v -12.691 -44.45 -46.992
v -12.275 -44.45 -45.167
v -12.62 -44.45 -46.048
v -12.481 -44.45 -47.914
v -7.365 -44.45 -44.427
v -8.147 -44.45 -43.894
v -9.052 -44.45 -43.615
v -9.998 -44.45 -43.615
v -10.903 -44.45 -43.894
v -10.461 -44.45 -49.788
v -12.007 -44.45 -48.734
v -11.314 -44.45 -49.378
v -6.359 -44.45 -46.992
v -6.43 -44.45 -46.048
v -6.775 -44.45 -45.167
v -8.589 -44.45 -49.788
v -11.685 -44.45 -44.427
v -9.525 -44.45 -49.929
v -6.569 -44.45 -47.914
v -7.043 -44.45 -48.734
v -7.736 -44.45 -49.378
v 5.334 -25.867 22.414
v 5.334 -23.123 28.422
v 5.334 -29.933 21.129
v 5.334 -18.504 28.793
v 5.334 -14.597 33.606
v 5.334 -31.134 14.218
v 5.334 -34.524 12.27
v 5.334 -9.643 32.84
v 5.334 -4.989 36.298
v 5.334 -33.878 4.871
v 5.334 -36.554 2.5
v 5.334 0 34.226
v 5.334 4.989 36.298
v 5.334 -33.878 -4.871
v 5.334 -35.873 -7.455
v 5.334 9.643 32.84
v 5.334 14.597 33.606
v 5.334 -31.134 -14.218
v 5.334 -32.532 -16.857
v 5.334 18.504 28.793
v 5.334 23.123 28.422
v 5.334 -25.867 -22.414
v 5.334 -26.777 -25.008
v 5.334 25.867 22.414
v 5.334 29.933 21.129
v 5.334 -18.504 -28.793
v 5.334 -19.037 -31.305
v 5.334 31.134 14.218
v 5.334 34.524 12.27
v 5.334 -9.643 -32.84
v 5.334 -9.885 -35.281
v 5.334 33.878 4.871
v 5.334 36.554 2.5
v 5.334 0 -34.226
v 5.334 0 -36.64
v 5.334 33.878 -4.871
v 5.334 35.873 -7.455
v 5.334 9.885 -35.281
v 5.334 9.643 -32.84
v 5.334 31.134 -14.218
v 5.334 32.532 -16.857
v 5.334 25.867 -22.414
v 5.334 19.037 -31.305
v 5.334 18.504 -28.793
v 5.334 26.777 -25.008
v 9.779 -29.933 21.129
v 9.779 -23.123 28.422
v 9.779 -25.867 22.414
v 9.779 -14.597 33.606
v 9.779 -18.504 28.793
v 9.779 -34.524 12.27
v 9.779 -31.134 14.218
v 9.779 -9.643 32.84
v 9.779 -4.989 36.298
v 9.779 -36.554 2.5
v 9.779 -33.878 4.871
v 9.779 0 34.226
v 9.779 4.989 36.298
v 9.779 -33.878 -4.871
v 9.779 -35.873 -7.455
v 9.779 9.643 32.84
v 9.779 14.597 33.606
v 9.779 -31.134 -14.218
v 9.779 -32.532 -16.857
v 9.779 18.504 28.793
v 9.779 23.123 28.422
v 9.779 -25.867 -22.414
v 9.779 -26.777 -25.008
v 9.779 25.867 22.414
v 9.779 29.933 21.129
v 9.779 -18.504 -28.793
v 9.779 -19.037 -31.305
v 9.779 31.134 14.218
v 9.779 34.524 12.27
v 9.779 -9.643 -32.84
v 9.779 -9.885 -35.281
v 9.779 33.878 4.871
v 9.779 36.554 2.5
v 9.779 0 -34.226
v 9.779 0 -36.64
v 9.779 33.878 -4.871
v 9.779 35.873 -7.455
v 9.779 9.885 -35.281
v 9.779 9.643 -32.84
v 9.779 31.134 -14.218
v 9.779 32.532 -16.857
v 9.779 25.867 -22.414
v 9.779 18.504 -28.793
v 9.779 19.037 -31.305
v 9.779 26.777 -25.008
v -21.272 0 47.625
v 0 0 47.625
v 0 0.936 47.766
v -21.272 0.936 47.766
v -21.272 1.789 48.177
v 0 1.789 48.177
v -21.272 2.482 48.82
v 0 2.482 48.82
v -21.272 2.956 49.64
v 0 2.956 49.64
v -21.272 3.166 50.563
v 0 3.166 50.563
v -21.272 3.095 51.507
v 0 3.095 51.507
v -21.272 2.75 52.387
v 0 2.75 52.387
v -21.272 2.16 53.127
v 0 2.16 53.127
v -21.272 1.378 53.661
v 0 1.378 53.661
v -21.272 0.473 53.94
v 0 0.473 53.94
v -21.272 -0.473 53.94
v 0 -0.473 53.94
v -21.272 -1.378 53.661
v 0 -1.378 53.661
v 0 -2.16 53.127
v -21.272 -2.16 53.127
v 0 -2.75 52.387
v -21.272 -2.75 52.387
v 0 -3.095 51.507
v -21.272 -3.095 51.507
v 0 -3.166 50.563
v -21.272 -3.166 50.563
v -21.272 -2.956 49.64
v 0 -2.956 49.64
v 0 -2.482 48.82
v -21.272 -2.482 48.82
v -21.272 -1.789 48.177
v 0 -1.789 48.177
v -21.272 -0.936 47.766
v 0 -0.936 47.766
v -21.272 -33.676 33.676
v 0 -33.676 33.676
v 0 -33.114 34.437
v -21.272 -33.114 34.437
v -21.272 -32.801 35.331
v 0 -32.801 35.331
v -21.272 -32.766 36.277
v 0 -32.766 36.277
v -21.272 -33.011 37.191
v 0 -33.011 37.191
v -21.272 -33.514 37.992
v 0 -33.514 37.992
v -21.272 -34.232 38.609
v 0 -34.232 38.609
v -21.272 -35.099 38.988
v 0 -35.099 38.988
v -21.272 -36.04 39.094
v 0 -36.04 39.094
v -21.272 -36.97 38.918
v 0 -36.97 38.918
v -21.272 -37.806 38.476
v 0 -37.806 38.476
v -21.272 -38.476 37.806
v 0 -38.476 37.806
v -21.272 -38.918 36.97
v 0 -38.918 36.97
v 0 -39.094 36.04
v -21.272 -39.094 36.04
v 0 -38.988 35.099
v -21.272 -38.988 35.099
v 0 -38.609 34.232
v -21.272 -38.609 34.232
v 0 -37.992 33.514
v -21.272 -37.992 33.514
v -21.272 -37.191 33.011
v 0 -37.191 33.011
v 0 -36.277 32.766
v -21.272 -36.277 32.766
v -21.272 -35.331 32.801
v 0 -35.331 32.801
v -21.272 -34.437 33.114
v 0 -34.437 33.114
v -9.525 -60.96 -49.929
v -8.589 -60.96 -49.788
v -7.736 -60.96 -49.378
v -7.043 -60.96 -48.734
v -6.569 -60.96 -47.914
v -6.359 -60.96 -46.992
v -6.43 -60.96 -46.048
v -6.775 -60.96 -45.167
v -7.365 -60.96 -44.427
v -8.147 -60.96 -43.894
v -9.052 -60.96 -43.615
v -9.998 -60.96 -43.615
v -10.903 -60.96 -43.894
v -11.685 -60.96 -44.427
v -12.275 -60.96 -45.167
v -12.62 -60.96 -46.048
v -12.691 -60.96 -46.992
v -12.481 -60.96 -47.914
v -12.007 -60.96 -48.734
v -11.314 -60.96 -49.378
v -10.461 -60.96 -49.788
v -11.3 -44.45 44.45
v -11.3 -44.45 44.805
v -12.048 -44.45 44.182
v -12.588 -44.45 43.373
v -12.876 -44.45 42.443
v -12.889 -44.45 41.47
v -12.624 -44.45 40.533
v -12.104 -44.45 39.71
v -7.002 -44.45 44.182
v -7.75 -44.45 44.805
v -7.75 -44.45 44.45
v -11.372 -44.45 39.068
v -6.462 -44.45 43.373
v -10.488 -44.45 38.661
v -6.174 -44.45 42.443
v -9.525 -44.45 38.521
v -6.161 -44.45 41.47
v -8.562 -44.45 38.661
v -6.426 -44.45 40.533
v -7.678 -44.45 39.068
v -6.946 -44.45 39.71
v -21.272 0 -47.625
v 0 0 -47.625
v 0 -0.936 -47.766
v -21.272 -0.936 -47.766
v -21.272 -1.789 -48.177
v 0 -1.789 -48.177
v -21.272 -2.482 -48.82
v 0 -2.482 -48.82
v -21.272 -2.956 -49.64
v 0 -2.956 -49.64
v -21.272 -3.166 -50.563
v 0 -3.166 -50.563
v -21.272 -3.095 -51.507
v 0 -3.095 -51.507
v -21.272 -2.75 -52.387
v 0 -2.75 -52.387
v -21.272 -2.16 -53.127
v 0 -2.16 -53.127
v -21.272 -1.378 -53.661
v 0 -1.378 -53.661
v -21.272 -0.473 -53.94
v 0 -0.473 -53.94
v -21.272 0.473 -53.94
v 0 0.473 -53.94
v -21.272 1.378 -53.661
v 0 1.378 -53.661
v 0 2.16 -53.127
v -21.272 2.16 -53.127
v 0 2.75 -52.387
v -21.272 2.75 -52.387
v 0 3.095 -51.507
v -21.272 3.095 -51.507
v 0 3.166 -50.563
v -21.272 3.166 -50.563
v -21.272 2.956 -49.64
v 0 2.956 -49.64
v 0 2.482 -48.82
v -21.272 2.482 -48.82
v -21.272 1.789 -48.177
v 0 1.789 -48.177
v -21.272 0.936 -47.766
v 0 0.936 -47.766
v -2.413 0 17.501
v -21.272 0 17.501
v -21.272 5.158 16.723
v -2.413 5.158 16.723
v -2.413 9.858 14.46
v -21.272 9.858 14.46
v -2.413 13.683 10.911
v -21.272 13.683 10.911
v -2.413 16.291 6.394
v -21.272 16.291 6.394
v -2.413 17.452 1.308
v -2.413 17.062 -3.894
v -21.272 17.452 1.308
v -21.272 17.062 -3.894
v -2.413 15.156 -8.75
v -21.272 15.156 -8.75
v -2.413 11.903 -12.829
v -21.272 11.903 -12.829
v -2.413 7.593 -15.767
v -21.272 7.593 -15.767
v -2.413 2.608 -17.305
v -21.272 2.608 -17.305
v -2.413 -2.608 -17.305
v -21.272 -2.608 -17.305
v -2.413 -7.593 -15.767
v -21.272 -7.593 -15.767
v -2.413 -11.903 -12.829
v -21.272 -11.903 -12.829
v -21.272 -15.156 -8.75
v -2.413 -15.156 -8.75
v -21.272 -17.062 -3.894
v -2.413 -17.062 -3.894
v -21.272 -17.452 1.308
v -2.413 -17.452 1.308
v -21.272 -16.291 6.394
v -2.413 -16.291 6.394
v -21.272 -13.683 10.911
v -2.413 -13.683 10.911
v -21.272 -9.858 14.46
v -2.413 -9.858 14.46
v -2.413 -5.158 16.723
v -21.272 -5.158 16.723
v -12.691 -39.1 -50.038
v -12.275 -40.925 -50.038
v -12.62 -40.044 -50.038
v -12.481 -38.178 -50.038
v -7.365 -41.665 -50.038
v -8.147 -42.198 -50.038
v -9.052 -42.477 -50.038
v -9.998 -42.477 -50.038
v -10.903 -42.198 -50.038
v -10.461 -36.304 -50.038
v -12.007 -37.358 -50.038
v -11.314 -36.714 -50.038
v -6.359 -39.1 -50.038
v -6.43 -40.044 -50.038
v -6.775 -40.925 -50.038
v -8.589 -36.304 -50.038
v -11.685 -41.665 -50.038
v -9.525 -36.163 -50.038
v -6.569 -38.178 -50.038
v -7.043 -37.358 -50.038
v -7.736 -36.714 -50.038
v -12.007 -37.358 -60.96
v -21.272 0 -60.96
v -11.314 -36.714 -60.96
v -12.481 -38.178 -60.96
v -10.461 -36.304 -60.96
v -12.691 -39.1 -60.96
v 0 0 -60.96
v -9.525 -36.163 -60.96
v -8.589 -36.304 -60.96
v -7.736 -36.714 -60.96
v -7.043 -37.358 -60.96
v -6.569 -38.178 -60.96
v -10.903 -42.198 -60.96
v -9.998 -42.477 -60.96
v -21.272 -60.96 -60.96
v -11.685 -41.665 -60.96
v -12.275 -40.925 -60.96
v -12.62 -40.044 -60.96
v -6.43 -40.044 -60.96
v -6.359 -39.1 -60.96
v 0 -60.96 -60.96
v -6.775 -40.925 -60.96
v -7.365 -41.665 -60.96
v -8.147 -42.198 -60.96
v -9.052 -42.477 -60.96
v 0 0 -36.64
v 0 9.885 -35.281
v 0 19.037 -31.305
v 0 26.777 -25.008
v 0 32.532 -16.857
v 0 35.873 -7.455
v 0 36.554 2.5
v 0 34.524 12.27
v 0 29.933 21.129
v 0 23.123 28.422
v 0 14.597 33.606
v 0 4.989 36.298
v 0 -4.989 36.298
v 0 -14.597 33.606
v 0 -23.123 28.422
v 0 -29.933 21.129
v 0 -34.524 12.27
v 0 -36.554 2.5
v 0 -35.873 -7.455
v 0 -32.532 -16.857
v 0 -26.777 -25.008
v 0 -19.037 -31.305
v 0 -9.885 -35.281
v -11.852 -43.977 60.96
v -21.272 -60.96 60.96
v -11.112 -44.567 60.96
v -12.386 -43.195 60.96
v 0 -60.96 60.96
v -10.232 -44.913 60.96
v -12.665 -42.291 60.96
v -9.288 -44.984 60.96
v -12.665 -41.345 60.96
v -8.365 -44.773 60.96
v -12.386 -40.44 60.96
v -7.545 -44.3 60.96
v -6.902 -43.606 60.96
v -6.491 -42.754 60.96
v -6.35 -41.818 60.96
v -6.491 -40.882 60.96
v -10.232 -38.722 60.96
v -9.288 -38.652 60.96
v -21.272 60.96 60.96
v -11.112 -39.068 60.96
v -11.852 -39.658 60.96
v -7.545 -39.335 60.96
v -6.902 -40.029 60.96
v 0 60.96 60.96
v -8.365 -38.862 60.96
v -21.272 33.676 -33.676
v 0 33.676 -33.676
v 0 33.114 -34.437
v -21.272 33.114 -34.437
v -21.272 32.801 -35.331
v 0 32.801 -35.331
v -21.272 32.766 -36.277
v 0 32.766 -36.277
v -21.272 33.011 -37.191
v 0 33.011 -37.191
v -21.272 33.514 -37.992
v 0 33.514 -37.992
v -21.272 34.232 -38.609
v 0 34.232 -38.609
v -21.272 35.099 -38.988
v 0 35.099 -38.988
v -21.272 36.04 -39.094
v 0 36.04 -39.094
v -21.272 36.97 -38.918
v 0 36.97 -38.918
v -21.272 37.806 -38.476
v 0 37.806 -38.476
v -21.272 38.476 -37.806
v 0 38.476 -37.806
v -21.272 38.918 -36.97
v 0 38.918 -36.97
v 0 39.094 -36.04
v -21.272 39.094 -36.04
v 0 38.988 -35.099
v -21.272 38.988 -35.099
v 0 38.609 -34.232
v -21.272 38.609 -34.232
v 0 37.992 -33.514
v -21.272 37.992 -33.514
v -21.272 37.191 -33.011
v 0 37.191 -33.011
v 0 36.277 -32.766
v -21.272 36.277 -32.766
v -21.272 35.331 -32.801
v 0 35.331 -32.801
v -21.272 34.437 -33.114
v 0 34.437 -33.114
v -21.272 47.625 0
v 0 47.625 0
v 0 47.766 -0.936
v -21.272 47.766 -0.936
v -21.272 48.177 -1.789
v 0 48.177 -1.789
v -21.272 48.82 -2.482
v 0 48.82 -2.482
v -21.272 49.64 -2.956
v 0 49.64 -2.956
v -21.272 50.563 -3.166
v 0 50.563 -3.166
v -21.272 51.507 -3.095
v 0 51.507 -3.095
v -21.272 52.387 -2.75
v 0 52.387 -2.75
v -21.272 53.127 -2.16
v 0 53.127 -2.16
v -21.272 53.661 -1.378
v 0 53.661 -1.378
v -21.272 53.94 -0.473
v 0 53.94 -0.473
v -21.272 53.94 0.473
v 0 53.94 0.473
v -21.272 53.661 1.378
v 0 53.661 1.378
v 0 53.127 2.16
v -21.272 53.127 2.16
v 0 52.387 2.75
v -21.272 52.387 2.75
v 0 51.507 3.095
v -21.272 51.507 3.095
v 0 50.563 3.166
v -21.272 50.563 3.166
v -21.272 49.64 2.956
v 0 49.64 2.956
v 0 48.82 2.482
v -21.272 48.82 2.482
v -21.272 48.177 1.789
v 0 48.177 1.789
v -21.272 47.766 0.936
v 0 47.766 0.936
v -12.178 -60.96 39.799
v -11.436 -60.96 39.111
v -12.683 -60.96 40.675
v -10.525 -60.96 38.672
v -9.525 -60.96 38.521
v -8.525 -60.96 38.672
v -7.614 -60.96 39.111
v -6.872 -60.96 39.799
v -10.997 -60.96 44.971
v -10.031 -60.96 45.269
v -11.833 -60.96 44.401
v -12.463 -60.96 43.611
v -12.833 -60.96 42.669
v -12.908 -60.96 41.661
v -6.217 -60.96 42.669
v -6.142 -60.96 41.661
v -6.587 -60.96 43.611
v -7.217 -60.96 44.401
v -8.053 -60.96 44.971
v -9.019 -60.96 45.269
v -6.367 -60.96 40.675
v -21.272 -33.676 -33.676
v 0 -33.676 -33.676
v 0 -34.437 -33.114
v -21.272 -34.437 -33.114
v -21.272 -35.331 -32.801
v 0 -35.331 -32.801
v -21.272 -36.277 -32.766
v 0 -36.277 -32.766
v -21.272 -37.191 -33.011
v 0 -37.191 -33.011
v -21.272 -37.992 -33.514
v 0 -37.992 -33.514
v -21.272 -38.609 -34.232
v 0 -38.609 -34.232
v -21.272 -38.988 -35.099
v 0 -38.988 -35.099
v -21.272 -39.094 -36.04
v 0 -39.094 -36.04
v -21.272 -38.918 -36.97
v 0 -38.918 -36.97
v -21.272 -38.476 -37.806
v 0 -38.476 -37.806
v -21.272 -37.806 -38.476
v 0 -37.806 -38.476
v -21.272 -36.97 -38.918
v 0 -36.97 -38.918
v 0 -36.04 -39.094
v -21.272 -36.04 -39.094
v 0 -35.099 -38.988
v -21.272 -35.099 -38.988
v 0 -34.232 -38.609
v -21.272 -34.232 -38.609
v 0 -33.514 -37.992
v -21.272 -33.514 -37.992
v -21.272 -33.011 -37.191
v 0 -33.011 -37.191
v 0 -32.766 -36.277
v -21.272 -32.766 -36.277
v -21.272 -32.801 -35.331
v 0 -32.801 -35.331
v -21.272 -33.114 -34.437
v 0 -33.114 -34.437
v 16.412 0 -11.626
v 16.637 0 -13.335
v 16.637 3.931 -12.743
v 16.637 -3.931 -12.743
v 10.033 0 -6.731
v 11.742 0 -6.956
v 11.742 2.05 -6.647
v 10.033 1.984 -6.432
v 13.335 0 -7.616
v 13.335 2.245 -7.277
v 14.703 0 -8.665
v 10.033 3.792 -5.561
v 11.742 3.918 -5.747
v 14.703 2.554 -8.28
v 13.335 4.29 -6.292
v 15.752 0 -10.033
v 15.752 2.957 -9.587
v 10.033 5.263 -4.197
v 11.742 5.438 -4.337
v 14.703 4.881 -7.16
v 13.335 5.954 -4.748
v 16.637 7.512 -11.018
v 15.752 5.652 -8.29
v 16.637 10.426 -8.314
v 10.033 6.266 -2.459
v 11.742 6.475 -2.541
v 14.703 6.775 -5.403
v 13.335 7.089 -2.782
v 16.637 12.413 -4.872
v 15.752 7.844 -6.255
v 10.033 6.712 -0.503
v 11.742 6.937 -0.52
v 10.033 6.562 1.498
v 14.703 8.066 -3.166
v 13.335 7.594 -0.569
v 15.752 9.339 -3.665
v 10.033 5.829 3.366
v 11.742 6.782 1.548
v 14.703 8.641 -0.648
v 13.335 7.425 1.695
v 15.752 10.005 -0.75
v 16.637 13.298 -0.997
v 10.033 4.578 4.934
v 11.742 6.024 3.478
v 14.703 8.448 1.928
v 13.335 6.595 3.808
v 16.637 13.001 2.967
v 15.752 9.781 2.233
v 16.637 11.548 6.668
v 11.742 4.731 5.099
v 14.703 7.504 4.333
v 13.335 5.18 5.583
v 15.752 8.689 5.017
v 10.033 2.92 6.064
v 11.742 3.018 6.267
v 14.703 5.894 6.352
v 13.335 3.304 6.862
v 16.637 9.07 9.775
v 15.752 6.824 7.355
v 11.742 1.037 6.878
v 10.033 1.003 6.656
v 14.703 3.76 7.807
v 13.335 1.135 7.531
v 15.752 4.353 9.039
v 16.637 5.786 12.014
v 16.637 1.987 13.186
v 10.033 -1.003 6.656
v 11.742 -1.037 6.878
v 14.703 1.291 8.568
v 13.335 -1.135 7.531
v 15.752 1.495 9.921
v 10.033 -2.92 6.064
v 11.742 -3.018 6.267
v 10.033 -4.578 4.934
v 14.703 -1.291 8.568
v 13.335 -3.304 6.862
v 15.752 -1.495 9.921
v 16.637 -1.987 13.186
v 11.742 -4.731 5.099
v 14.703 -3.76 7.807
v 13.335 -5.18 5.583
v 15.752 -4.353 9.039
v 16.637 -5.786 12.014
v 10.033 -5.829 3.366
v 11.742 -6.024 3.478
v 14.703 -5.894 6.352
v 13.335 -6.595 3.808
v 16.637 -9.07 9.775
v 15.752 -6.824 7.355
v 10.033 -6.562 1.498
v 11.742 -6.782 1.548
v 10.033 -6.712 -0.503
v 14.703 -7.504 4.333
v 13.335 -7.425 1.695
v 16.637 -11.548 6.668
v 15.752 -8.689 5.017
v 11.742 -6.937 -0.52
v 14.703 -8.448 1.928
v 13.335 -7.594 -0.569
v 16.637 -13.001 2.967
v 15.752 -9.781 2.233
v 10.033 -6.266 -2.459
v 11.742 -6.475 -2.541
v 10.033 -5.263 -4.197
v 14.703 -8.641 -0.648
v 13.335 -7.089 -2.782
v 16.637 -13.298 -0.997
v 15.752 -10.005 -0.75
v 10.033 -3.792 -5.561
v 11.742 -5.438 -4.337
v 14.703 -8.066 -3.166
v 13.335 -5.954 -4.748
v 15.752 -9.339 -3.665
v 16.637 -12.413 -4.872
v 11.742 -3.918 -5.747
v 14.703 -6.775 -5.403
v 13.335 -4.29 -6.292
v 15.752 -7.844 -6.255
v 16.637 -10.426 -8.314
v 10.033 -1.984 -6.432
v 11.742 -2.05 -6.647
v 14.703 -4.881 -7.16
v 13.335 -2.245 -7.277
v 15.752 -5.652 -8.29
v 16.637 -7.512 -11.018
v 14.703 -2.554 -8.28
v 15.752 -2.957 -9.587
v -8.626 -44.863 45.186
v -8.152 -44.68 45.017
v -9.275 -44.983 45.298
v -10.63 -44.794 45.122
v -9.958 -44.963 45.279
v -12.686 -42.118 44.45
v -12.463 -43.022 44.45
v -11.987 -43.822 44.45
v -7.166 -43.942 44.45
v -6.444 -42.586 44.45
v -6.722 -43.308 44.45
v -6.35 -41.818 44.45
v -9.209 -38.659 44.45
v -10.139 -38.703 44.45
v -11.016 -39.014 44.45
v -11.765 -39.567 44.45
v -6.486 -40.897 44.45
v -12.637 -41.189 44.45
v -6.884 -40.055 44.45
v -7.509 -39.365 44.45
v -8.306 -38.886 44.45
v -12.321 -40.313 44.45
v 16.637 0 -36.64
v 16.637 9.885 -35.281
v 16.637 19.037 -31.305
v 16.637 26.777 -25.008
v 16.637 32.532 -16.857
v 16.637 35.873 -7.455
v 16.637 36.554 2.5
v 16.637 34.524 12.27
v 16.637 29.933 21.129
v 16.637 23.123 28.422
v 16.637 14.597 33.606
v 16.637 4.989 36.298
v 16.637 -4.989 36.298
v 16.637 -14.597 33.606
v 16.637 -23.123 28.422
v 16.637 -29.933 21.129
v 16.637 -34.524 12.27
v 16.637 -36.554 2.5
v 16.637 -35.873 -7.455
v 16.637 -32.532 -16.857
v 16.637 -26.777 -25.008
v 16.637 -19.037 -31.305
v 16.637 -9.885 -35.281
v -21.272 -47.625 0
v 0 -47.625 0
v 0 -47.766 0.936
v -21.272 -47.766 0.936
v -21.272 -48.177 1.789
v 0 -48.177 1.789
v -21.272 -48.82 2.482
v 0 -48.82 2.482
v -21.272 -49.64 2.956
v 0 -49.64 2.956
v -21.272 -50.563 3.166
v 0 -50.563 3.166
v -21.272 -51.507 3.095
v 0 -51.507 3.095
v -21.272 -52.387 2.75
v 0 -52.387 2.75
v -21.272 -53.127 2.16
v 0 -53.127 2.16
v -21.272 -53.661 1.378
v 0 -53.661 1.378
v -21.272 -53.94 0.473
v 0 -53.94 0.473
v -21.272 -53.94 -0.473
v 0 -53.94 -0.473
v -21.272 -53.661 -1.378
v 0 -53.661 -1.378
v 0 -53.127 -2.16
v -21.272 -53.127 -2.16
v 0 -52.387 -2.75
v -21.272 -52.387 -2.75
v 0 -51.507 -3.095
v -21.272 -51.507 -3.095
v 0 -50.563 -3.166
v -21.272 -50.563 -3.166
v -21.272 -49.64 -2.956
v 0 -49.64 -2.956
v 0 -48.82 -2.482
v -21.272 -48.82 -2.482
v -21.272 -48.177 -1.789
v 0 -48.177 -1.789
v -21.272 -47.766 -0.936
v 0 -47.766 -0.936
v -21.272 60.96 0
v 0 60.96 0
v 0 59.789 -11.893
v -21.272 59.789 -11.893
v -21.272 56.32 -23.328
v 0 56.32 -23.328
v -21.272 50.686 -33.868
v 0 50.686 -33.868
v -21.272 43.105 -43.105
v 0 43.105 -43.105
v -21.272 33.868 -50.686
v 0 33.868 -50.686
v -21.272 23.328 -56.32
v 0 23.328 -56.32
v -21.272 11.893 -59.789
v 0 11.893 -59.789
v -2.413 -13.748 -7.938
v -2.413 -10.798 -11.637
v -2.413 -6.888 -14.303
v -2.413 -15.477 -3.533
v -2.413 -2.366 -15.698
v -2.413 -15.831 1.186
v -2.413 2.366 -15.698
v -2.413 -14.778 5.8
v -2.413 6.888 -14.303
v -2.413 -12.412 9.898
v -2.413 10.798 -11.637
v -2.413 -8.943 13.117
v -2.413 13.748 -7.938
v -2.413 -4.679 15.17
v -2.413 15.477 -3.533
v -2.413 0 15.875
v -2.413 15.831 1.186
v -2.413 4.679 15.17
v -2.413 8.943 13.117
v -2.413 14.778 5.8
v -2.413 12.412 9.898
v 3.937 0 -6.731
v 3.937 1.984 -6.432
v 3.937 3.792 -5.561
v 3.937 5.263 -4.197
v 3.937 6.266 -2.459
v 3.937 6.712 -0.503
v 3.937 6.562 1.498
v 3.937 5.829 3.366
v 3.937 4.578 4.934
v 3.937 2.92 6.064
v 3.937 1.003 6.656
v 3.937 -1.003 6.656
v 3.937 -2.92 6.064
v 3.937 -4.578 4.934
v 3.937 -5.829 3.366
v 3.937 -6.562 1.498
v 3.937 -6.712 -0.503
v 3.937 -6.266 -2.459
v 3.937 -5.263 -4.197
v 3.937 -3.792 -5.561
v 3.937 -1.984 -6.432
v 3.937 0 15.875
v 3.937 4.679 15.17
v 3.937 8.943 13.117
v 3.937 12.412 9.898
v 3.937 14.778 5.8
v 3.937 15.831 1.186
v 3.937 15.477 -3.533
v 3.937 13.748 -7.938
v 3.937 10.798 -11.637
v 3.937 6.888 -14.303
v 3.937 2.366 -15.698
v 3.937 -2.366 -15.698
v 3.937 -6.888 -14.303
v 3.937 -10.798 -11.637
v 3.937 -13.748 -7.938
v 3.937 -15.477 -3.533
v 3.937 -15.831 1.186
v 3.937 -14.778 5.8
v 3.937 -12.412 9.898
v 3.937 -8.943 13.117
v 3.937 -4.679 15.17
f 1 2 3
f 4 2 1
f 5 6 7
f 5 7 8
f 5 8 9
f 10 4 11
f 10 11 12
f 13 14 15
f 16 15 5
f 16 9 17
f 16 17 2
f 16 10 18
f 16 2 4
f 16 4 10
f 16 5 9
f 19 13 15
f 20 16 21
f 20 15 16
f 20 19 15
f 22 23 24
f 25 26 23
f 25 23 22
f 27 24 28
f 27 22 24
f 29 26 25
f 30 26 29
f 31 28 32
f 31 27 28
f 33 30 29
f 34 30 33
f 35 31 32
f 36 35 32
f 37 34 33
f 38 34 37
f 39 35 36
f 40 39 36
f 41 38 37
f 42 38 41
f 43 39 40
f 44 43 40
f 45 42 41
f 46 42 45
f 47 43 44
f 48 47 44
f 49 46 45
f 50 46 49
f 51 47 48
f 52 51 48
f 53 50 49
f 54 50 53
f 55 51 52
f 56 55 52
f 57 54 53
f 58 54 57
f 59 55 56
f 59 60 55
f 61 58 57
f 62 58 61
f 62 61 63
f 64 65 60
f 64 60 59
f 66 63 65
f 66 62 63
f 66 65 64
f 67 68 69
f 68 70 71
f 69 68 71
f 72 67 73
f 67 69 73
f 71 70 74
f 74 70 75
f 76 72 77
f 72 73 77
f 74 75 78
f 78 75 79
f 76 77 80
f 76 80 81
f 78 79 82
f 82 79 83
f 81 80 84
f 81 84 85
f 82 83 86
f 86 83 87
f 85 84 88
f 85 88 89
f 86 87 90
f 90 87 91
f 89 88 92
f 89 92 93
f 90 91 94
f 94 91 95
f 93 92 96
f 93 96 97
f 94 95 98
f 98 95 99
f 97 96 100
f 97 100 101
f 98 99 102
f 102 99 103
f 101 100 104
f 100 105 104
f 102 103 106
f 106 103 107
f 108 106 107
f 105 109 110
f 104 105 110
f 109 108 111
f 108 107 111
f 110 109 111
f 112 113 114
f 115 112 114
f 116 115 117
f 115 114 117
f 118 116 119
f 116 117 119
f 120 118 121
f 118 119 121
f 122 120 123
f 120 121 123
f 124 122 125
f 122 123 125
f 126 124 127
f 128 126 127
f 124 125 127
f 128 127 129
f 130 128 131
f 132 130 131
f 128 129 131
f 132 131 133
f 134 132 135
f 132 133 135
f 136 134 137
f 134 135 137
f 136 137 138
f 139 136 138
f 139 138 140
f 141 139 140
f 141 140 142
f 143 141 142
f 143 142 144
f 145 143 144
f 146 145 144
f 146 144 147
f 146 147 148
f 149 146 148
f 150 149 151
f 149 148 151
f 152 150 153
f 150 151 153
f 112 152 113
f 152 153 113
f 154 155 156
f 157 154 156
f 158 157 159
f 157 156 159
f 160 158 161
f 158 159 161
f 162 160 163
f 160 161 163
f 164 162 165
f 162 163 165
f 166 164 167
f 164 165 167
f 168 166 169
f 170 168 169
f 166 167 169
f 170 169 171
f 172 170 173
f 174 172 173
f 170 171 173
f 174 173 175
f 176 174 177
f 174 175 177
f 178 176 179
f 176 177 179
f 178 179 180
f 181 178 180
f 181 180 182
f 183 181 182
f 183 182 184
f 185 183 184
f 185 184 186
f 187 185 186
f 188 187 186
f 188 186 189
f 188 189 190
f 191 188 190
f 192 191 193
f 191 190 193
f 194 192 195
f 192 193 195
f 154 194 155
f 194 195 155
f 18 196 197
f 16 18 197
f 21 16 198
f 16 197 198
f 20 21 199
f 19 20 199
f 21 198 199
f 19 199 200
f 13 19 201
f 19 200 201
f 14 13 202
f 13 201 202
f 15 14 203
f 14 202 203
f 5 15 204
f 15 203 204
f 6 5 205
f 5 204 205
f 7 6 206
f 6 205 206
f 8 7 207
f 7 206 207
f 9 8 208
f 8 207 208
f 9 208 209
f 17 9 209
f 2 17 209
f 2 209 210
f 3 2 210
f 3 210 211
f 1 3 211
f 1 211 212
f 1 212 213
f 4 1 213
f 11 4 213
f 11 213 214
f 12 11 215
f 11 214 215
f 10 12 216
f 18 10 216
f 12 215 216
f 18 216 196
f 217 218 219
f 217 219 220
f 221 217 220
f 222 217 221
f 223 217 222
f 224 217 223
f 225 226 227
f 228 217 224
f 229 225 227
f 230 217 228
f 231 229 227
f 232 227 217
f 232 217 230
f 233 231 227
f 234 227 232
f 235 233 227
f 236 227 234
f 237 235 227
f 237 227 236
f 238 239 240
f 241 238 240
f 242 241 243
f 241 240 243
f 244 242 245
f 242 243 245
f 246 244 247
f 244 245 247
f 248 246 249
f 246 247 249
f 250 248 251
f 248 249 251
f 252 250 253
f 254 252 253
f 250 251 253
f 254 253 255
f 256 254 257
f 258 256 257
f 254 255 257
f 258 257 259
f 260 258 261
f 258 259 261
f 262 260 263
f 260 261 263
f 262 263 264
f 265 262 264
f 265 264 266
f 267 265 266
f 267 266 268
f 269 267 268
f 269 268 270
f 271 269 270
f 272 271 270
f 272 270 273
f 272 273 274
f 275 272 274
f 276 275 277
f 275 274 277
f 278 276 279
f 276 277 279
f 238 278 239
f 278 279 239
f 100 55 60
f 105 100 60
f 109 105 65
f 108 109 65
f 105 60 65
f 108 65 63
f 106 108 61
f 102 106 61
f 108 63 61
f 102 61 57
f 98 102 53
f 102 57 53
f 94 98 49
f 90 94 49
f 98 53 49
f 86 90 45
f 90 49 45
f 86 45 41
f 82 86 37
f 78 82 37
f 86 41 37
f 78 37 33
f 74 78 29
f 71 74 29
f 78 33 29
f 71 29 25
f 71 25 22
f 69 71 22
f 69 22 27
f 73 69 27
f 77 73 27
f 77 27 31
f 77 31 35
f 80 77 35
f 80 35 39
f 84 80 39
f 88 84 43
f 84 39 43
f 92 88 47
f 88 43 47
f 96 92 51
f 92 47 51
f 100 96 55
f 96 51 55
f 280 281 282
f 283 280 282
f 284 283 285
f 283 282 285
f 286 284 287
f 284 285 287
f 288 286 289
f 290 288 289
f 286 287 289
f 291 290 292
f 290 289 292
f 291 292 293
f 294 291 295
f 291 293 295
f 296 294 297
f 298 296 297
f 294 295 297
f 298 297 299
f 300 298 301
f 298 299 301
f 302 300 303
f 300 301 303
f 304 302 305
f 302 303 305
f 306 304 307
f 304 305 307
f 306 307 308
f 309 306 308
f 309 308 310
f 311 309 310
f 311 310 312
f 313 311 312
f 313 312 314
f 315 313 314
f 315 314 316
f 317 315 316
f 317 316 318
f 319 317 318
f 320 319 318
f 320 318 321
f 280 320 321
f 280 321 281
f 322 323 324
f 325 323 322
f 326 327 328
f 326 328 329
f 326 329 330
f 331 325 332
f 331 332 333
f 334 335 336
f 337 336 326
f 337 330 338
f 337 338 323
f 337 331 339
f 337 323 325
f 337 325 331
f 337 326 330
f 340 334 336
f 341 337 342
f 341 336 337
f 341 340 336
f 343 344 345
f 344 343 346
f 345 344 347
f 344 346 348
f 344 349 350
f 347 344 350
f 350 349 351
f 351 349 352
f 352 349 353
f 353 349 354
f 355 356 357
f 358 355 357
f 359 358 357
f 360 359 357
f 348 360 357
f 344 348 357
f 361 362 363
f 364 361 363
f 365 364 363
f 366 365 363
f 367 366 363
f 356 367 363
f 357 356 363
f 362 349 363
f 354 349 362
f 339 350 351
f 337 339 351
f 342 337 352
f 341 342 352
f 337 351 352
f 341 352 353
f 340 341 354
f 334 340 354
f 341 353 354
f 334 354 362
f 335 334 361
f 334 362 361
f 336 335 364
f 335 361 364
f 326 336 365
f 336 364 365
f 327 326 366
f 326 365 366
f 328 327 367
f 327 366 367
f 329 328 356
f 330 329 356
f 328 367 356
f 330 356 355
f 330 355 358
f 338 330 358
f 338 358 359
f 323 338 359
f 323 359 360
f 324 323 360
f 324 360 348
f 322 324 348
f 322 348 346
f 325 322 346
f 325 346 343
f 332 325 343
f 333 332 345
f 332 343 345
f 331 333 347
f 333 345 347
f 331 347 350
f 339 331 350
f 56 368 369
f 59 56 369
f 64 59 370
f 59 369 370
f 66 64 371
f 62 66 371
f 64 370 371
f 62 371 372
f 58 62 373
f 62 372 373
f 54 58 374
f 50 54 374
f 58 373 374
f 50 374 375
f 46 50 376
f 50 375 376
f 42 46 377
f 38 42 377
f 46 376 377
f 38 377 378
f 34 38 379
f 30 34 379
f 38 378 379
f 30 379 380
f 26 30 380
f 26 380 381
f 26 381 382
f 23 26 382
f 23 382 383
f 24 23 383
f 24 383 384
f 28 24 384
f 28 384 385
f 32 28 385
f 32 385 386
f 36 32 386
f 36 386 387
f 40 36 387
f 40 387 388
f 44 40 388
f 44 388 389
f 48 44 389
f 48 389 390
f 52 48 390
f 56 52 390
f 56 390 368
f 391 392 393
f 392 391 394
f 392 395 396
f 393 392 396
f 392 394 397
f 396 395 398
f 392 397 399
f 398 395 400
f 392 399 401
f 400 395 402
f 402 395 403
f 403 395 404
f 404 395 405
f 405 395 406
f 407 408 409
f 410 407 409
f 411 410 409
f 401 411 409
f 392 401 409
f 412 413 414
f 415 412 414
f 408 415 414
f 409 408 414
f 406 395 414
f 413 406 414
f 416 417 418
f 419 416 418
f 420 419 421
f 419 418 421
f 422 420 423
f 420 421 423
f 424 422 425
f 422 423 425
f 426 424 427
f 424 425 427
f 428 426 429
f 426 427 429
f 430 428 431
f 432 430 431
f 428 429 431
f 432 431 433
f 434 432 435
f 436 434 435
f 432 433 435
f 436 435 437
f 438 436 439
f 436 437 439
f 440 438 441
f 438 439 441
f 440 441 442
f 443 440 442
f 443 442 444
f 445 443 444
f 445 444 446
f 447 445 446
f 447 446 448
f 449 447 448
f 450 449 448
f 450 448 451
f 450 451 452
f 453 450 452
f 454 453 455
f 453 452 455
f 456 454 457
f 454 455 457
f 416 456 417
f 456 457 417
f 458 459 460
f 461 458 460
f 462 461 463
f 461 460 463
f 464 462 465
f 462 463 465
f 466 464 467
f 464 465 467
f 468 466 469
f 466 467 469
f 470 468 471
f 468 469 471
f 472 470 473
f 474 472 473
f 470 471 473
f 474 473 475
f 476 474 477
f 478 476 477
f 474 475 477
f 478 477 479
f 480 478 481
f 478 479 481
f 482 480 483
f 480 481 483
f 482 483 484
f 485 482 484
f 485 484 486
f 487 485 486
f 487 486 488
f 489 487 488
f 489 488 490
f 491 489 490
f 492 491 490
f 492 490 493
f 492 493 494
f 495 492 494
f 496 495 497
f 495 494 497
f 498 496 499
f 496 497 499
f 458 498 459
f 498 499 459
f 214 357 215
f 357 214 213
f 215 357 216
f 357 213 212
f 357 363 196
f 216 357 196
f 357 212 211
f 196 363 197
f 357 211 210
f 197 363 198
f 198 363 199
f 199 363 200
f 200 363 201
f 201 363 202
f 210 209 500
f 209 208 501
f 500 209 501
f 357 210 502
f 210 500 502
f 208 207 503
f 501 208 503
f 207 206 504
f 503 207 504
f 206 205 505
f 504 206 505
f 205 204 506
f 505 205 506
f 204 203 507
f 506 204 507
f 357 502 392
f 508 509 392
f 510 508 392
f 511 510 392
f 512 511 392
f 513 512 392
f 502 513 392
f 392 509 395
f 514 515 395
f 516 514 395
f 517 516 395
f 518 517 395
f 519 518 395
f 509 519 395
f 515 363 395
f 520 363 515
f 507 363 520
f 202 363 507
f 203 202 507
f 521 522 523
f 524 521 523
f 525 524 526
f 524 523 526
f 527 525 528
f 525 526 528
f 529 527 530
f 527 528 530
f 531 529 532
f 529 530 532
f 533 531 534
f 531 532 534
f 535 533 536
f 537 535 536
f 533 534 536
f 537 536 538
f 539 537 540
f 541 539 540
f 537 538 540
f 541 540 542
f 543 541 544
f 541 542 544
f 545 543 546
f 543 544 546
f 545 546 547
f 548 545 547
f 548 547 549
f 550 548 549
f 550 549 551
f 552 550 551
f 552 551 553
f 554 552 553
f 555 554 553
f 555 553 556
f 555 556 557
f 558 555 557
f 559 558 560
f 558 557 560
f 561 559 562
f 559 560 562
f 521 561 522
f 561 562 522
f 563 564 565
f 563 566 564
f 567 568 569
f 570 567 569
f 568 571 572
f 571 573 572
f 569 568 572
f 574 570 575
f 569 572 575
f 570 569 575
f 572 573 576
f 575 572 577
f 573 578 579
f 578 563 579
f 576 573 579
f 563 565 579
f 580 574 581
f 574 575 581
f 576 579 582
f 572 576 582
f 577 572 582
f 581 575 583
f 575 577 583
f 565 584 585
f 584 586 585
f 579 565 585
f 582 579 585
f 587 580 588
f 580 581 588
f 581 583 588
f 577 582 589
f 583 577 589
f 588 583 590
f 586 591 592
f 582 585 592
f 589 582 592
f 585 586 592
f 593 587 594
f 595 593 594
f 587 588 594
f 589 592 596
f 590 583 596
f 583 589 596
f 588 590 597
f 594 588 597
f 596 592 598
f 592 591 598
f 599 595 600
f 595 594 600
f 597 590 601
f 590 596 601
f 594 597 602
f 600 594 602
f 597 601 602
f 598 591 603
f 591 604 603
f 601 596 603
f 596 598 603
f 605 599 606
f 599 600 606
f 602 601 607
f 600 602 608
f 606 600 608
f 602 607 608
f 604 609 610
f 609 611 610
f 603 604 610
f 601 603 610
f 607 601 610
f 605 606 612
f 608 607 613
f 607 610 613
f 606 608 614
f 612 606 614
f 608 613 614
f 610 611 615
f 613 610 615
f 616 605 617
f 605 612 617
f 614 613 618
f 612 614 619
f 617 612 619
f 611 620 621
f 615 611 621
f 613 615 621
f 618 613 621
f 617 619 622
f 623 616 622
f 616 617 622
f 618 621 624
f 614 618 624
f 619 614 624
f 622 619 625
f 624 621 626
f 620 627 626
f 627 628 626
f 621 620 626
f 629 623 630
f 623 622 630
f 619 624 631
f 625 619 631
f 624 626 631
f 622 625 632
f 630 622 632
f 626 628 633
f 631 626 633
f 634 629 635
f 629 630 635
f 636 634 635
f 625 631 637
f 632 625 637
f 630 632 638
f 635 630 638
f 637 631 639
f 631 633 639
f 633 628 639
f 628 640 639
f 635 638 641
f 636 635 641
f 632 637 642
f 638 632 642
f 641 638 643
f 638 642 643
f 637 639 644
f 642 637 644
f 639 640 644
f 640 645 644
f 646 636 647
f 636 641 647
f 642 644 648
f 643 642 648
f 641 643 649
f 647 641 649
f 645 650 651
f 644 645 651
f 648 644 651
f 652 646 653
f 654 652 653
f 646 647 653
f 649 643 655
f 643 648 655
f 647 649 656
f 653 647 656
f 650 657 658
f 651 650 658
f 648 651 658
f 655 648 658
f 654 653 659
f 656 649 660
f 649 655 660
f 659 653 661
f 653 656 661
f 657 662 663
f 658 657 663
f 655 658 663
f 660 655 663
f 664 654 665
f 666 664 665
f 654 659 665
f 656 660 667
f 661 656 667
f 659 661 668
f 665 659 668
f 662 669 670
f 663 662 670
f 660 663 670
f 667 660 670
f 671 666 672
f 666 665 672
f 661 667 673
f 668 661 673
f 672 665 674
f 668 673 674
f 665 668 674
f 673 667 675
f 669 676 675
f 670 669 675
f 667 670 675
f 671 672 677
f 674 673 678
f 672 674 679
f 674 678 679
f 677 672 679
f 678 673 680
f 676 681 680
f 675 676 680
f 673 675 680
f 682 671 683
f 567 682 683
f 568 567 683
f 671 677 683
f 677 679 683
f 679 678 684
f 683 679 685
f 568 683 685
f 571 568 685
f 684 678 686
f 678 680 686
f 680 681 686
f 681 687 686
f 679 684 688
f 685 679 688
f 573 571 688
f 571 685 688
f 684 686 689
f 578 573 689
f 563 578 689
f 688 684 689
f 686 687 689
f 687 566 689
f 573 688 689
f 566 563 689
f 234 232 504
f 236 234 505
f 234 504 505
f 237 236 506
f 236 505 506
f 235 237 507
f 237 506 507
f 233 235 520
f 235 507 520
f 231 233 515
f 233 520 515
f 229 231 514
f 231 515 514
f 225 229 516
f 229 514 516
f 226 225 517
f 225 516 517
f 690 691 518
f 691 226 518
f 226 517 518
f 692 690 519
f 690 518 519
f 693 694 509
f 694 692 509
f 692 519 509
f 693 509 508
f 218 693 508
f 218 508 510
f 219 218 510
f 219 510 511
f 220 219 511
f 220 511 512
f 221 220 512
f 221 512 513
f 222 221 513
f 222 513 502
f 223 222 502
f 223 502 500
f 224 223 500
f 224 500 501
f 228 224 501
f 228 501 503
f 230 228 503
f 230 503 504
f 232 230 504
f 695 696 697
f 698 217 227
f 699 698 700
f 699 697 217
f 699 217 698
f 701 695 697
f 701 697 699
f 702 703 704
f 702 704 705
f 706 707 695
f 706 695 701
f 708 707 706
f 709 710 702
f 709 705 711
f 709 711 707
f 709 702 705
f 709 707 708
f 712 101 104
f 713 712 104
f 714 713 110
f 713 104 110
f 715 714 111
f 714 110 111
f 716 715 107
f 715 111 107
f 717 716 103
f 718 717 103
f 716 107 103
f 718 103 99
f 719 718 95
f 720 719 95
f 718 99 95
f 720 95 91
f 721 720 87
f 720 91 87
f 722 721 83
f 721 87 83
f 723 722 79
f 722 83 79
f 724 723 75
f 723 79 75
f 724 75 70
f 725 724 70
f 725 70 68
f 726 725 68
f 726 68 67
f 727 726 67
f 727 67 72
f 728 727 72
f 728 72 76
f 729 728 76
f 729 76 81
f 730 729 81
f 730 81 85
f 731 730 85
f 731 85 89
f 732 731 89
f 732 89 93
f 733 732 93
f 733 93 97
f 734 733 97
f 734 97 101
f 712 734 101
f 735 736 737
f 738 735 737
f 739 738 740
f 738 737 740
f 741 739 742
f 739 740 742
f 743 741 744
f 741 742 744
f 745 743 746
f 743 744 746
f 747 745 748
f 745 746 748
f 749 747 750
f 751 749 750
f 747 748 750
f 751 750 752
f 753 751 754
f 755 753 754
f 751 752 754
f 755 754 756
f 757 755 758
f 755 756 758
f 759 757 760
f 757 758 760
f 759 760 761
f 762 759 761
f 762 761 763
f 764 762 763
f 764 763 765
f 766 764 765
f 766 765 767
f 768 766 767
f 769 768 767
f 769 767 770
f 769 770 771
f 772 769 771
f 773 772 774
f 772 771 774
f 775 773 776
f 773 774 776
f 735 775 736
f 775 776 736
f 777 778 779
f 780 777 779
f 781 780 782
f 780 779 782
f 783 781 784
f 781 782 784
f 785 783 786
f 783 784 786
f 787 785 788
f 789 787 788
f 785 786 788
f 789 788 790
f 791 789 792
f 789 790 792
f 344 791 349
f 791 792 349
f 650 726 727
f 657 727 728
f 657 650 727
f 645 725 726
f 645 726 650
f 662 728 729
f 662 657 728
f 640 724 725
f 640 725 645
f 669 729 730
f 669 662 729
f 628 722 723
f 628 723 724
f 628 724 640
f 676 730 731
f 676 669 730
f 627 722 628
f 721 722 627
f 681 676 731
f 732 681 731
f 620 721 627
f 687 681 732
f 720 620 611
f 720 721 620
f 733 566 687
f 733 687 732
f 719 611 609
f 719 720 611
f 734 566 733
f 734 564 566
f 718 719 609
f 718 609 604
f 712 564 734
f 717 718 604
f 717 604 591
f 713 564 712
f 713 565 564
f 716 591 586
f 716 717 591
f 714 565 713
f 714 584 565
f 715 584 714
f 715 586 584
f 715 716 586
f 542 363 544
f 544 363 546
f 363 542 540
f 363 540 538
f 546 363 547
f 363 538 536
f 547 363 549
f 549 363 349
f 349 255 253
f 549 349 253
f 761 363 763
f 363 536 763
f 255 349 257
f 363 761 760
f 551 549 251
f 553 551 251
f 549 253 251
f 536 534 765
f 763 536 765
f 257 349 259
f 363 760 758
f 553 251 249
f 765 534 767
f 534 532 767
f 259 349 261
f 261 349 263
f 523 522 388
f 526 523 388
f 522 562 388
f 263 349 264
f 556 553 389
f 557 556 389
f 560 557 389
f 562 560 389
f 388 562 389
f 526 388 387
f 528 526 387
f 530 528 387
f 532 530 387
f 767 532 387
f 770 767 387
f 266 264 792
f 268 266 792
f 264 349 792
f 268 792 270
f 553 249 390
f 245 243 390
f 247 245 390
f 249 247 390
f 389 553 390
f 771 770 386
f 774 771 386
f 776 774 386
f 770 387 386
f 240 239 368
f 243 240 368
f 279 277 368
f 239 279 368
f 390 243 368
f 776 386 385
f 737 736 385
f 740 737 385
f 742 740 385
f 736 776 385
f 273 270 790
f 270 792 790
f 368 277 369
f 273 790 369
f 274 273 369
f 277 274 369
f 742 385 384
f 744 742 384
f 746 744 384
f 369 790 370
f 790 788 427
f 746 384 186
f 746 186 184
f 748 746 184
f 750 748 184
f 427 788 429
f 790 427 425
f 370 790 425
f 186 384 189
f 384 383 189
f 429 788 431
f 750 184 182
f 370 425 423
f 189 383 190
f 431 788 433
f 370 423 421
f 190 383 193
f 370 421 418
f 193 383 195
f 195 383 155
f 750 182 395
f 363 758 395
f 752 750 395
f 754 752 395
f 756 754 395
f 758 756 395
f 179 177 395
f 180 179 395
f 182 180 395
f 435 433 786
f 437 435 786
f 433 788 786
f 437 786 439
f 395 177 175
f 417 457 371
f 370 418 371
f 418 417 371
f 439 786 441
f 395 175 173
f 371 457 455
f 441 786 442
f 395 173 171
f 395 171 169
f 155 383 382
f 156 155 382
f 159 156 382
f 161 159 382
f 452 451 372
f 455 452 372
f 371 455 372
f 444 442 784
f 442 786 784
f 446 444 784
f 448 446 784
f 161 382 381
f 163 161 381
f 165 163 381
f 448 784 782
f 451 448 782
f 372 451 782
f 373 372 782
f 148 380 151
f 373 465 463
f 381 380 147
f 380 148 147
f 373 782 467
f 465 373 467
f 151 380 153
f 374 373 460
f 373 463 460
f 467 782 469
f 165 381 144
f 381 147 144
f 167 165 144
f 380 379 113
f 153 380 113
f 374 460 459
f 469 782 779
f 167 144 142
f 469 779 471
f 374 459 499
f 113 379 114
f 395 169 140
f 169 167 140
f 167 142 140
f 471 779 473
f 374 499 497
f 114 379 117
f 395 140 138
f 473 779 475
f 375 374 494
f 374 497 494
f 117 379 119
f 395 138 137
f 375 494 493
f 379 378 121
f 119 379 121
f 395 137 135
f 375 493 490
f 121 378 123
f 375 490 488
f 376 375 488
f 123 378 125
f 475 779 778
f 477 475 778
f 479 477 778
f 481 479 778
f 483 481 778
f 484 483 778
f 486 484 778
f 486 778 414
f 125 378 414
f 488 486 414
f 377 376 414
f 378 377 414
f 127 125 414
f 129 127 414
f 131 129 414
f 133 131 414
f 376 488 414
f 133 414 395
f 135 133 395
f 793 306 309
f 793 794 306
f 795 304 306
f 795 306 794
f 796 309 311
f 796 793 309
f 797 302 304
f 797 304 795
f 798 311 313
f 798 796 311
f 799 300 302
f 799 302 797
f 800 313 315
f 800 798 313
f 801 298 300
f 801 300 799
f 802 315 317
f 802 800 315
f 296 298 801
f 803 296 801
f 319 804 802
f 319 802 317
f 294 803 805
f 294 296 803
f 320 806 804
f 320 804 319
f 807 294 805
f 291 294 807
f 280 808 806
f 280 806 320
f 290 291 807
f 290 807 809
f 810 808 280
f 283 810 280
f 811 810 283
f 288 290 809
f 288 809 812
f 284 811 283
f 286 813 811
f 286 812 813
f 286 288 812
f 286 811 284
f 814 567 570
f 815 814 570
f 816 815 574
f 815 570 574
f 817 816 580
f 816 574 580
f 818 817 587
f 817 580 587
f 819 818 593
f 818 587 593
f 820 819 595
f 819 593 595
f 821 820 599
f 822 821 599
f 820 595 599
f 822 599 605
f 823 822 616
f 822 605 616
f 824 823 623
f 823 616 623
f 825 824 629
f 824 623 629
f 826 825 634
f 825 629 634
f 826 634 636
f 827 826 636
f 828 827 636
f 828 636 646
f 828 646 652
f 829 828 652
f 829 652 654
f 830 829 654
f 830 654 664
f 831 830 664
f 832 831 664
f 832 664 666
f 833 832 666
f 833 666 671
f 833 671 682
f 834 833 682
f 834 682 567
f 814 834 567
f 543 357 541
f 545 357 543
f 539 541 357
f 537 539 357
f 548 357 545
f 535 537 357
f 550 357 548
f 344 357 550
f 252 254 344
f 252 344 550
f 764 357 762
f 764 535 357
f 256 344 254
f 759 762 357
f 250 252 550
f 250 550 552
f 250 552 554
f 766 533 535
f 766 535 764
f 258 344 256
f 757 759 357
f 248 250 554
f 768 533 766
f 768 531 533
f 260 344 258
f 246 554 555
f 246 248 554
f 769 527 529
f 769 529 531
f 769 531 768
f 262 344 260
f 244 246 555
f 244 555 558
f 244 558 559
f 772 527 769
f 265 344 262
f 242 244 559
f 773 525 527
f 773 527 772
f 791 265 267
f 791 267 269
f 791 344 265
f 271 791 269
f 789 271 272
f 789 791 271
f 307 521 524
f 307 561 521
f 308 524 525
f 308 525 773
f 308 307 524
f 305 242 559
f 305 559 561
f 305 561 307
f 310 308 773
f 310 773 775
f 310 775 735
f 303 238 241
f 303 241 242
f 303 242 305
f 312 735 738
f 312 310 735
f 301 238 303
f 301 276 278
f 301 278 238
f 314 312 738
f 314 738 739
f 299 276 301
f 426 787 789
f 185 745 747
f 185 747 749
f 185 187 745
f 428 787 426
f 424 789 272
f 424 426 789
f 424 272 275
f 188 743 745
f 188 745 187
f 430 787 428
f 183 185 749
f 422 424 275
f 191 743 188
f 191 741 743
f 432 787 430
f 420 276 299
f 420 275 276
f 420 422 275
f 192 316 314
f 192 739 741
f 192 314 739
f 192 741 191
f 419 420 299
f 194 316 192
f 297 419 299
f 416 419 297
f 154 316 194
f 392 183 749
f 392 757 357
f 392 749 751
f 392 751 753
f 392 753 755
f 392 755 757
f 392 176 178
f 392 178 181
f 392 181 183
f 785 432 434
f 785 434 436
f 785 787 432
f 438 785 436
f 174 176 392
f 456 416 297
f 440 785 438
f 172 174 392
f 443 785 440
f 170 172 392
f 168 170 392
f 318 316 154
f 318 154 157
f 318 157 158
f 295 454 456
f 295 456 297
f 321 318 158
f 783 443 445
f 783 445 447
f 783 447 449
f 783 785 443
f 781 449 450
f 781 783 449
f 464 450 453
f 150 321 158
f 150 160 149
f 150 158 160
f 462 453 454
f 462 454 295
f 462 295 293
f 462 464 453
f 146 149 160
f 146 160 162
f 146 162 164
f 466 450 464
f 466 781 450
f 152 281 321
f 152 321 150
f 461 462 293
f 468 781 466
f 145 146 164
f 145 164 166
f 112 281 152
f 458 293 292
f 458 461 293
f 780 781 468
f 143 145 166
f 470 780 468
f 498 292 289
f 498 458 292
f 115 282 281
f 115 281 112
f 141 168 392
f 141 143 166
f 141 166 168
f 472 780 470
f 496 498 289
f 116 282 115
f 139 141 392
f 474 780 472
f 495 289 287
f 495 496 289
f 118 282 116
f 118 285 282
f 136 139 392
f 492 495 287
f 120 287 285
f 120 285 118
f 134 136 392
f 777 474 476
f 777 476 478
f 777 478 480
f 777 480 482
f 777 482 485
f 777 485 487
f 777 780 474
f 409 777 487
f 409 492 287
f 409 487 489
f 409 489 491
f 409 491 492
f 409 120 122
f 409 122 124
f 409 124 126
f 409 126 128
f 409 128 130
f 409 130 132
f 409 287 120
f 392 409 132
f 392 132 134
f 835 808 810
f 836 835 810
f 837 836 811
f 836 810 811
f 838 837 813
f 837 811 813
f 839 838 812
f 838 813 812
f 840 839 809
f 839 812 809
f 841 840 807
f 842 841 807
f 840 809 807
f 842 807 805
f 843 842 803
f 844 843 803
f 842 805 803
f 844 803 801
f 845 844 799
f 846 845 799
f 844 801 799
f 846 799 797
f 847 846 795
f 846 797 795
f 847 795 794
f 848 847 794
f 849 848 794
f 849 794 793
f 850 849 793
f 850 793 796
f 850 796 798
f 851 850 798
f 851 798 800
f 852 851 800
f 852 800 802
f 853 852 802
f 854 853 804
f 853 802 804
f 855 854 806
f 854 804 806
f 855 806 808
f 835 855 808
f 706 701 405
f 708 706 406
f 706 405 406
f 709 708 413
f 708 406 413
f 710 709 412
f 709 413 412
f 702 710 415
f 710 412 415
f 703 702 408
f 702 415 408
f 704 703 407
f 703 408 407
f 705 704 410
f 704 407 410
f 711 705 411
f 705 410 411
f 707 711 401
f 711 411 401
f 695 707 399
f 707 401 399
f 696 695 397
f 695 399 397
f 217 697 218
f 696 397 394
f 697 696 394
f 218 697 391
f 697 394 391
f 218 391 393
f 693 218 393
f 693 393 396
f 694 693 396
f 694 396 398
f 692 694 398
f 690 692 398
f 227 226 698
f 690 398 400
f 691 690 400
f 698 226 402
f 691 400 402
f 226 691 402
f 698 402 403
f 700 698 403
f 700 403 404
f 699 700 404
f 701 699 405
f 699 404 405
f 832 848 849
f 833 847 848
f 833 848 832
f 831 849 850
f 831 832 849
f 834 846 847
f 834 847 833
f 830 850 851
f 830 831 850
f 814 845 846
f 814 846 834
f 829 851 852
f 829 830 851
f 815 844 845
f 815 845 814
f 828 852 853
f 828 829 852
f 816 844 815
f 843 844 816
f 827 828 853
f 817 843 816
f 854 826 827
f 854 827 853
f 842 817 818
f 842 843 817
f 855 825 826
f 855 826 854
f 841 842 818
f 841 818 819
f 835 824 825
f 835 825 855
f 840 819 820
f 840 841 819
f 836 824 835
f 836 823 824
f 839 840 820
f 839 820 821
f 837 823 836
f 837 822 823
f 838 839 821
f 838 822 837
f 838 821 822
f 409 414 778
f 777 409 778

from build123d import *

# Parameters (mm, degrees)
SKETCH1_R                     = 36.6395
HOUSING_FITTING_EXTRUDE_DEPTH = 16.637
HOUSING_BODY_1_DEPTH          = 21.2725
SKETCH3_R                     = 6.731
IMPELLER_BORE_DEPTH           = 17.018
SKETCH4_R                     = 4
SHAFT_BORE_DEPTH              = 20.8915
O_RING_CUT_DEPTH              = 1.27
O_RING_CUT_DEPTH_BACK         = 3.175
SKETCH5_R                     = 36.6395
SKETCH5_R_2                   = 34.2265
SKETCH12_R                    = 3.175
CUT_EXTRUDE2_DEPTH            = 21.2725
CIRPATTERN1_COUNT             = 8
SKETCH13_R                    = 3.175
CUT_EXTRUDE3_DEPTH            = 16.51
SKETCH14_R                    = 3.175
SKETCH14_R_2                  = 3.392842108
CUT_EXTRUDE4_DEPTH            = 16.51
SKETCH15_R                    = 3.175
CUT_EXTRUDE5_DEPTH            = 10.922
FILLET1_R                     = 6.604
SKETCH17_R                    = 17.5006
CUT_EXTRUDE8_DEPTH            = 25.2095
BOSS_EXTRUDE1_START           = 6.35
SKETCH18_R                    = 17.5006
SKETCH18_R_2                  = 15.875
BOSS_EXTRUDE1_DEPTH           = 6.35


with BuildPart() as part:
    # Sketch1 → Housing Fitting Extrude (new body)
    with BuildSketch(Plane(origin=(0, 0, 0), x_dir=(0, 0, -1), z_dir=(1, 0, 0))):
        Circle(SKETCH1_R)
    extrude(amount=HOUSING_FITTING_EXTRUDE_DEPTH)

    # Sketch2 → Housing Body 1 (add)
    with BuildSketch(Plane.ZY):
        with BuildLine():
            Line((60.96, 0), (60.96, 60.96))
            Line((60.96, 60.96), (0, 60.96))
            ThreePointArc((0, 60.96), (-43.105229381, 43.105229381), (-60.96, 0))
            Line((-60.96, 0), (-60.96, -54.61))
            Line((-60.96, -54.61), (-60.96, -60.96))
            Line((-60.96, -60.96), (60.96, -60.96))
            Line((60.96, -60.96), (60.96, -54.61))
            Line((60.96, -54.61), (60.96, 0))
        make_face()
    extrude(amount=HOUSING_BODY_1_DEPTH)

    # Sketch3 → Impeller Bore (cut)
    with BuildSketch(Plane(origin=(16.637, 0, 0), x_dir=(0, 0, -1), z_dir=(1, 0, 0))):
        Circle(SKETCH3_R)
    extrude(amount=-IMPELLER_BORE_DEPTH, mode=Mode.SUBTRACT)

    # Sketch4 → Shaft Bore (cut)
    with BuildSketch(Plane(origin=(-0.381, 0, 0), x_dir=(0, 0, -1), z_dir=(1, 0, 0))):
        Circle(SKETCH4_R)
    extrude(amount=-SHAFT_BORE_DEPTH, mode=Mode.SUBTRACT)

    # Sketch5 → O-Ring Cut (cut, two sides: drawn at the far end of the back side and taken through both)
    with BuildSketch(Plane(origin=(8.509, 0, 0), x_dir=(0, 0, -1), z_dir=(1, 0, 0)).offset(-O_RING_CUT_DEPTH_BACK)):
        Circle(SKETCH5_R)
        Circle(SKETCH5_R_2, mode=Mode.SUBTRACT)
    extrude(amount=O_RING_CUT_DEPTH + O_RING_CUT_DEPTH_BACK, mode=Mode.SUBTRACT)

    # Sketch12 → Cut-Extrude2 (cut)
    with BuildSketch(Plane(origin=(0, 0, 0), x_dir=(0, 0, -1), z_dir=(1, 0, 0))):
        with Locations((-50.8, 0)):
            Circle(SKETCH12_R)
    cut_extrude2 = extrude(amount=-CUT_EXTRUDE2_DEPTH, mode=Mode.SUBTRACT)

    # CirPattern1: Cut-Extrude2 ×8 about axis, 1 skipped
    cirpattern1_axis = Axis((0, 0, 0), (1, 0, 0))
    add([cut_extrude2.rotate(cirpattern1_axis, i * 360 / CIRPATTERN1_COUNT) for i in range(1, CIRPATTERN1_COUNT) if i not in (7,)], mode=Mode.SUBTRACT)

    # Sketch13 → Cut-Extrude3 (cut)
    with BuildSketch(Plane.XY.offset(60.96)):
        with Locations((-9.525, -41.817738443)):
            Circle(SKETCH13_R)
    extrude(amount=-CUT_EXTRUDE3_DEPTH, mode=Mode.SUBTRACT)

    # Sketch14 → Cut-Extrude4 (cut)
    with BuildSketch(Plane.XZ.offset(60.96)):
        with Locations(Location((-9.525, -46.754349092, 0), (0, 0, 270))):
            Circle(SKETCH14_R)
        with Locations(Location((-9.525, 41.914080666, 0), (0, 0, 270))):
            Circle(SKETCH14_R_2)
    extrude(amount=-CUT_EXTRUDE4_DEPTH, mode=Mode.SUBTRACT)

    # Sketch15 → Cut-Extrude5 (cut)
    with BuildSketch(Plane(origin=(0, 0, -60.96), x_dir=(-1, 0, 0), z_dir=(0, 0, -1))):
        with Locations(Location((9.525, -39.337514031, 0), (0, 0, 90))):
            Circle(SKETCH15_R)
    extrude(amount=-CUT_EXTRUDE5_DEPTH, mode=Mode.SUBTRACT)

    # Fillet1
    fillet1_edges = [part.edges().sort_by_distance(p)[0] for p in [
        (16.637, 0, 6.731),
    ]]
    fillet(fillet1_edges, radius=FILLET1_R)

    # Sketch17 → Cut-Extrude8 (cut)
    with BuildSketch(Plane.ZY.offset(21.2725)):
        Circle(SKETCH17_R)
    extrude(amount=-CUT_EXTRUDE8_DEPTH, mode=Mode.SUBTRACT)

    # Sketch18 → Boss-Extrude1 (add)
    with BuildSketch(Plane.ZY.offset(-3.937).offset(BOSS_EXTRUDE1_START)):
        Circle(SKETCH18_R)
        Circle(SKETCH18_R_2, mode=Mode.SUBTRACT)
    extrude(amount=-BOSS_EXTRUDE1_DEPTH)


solid = part.part
